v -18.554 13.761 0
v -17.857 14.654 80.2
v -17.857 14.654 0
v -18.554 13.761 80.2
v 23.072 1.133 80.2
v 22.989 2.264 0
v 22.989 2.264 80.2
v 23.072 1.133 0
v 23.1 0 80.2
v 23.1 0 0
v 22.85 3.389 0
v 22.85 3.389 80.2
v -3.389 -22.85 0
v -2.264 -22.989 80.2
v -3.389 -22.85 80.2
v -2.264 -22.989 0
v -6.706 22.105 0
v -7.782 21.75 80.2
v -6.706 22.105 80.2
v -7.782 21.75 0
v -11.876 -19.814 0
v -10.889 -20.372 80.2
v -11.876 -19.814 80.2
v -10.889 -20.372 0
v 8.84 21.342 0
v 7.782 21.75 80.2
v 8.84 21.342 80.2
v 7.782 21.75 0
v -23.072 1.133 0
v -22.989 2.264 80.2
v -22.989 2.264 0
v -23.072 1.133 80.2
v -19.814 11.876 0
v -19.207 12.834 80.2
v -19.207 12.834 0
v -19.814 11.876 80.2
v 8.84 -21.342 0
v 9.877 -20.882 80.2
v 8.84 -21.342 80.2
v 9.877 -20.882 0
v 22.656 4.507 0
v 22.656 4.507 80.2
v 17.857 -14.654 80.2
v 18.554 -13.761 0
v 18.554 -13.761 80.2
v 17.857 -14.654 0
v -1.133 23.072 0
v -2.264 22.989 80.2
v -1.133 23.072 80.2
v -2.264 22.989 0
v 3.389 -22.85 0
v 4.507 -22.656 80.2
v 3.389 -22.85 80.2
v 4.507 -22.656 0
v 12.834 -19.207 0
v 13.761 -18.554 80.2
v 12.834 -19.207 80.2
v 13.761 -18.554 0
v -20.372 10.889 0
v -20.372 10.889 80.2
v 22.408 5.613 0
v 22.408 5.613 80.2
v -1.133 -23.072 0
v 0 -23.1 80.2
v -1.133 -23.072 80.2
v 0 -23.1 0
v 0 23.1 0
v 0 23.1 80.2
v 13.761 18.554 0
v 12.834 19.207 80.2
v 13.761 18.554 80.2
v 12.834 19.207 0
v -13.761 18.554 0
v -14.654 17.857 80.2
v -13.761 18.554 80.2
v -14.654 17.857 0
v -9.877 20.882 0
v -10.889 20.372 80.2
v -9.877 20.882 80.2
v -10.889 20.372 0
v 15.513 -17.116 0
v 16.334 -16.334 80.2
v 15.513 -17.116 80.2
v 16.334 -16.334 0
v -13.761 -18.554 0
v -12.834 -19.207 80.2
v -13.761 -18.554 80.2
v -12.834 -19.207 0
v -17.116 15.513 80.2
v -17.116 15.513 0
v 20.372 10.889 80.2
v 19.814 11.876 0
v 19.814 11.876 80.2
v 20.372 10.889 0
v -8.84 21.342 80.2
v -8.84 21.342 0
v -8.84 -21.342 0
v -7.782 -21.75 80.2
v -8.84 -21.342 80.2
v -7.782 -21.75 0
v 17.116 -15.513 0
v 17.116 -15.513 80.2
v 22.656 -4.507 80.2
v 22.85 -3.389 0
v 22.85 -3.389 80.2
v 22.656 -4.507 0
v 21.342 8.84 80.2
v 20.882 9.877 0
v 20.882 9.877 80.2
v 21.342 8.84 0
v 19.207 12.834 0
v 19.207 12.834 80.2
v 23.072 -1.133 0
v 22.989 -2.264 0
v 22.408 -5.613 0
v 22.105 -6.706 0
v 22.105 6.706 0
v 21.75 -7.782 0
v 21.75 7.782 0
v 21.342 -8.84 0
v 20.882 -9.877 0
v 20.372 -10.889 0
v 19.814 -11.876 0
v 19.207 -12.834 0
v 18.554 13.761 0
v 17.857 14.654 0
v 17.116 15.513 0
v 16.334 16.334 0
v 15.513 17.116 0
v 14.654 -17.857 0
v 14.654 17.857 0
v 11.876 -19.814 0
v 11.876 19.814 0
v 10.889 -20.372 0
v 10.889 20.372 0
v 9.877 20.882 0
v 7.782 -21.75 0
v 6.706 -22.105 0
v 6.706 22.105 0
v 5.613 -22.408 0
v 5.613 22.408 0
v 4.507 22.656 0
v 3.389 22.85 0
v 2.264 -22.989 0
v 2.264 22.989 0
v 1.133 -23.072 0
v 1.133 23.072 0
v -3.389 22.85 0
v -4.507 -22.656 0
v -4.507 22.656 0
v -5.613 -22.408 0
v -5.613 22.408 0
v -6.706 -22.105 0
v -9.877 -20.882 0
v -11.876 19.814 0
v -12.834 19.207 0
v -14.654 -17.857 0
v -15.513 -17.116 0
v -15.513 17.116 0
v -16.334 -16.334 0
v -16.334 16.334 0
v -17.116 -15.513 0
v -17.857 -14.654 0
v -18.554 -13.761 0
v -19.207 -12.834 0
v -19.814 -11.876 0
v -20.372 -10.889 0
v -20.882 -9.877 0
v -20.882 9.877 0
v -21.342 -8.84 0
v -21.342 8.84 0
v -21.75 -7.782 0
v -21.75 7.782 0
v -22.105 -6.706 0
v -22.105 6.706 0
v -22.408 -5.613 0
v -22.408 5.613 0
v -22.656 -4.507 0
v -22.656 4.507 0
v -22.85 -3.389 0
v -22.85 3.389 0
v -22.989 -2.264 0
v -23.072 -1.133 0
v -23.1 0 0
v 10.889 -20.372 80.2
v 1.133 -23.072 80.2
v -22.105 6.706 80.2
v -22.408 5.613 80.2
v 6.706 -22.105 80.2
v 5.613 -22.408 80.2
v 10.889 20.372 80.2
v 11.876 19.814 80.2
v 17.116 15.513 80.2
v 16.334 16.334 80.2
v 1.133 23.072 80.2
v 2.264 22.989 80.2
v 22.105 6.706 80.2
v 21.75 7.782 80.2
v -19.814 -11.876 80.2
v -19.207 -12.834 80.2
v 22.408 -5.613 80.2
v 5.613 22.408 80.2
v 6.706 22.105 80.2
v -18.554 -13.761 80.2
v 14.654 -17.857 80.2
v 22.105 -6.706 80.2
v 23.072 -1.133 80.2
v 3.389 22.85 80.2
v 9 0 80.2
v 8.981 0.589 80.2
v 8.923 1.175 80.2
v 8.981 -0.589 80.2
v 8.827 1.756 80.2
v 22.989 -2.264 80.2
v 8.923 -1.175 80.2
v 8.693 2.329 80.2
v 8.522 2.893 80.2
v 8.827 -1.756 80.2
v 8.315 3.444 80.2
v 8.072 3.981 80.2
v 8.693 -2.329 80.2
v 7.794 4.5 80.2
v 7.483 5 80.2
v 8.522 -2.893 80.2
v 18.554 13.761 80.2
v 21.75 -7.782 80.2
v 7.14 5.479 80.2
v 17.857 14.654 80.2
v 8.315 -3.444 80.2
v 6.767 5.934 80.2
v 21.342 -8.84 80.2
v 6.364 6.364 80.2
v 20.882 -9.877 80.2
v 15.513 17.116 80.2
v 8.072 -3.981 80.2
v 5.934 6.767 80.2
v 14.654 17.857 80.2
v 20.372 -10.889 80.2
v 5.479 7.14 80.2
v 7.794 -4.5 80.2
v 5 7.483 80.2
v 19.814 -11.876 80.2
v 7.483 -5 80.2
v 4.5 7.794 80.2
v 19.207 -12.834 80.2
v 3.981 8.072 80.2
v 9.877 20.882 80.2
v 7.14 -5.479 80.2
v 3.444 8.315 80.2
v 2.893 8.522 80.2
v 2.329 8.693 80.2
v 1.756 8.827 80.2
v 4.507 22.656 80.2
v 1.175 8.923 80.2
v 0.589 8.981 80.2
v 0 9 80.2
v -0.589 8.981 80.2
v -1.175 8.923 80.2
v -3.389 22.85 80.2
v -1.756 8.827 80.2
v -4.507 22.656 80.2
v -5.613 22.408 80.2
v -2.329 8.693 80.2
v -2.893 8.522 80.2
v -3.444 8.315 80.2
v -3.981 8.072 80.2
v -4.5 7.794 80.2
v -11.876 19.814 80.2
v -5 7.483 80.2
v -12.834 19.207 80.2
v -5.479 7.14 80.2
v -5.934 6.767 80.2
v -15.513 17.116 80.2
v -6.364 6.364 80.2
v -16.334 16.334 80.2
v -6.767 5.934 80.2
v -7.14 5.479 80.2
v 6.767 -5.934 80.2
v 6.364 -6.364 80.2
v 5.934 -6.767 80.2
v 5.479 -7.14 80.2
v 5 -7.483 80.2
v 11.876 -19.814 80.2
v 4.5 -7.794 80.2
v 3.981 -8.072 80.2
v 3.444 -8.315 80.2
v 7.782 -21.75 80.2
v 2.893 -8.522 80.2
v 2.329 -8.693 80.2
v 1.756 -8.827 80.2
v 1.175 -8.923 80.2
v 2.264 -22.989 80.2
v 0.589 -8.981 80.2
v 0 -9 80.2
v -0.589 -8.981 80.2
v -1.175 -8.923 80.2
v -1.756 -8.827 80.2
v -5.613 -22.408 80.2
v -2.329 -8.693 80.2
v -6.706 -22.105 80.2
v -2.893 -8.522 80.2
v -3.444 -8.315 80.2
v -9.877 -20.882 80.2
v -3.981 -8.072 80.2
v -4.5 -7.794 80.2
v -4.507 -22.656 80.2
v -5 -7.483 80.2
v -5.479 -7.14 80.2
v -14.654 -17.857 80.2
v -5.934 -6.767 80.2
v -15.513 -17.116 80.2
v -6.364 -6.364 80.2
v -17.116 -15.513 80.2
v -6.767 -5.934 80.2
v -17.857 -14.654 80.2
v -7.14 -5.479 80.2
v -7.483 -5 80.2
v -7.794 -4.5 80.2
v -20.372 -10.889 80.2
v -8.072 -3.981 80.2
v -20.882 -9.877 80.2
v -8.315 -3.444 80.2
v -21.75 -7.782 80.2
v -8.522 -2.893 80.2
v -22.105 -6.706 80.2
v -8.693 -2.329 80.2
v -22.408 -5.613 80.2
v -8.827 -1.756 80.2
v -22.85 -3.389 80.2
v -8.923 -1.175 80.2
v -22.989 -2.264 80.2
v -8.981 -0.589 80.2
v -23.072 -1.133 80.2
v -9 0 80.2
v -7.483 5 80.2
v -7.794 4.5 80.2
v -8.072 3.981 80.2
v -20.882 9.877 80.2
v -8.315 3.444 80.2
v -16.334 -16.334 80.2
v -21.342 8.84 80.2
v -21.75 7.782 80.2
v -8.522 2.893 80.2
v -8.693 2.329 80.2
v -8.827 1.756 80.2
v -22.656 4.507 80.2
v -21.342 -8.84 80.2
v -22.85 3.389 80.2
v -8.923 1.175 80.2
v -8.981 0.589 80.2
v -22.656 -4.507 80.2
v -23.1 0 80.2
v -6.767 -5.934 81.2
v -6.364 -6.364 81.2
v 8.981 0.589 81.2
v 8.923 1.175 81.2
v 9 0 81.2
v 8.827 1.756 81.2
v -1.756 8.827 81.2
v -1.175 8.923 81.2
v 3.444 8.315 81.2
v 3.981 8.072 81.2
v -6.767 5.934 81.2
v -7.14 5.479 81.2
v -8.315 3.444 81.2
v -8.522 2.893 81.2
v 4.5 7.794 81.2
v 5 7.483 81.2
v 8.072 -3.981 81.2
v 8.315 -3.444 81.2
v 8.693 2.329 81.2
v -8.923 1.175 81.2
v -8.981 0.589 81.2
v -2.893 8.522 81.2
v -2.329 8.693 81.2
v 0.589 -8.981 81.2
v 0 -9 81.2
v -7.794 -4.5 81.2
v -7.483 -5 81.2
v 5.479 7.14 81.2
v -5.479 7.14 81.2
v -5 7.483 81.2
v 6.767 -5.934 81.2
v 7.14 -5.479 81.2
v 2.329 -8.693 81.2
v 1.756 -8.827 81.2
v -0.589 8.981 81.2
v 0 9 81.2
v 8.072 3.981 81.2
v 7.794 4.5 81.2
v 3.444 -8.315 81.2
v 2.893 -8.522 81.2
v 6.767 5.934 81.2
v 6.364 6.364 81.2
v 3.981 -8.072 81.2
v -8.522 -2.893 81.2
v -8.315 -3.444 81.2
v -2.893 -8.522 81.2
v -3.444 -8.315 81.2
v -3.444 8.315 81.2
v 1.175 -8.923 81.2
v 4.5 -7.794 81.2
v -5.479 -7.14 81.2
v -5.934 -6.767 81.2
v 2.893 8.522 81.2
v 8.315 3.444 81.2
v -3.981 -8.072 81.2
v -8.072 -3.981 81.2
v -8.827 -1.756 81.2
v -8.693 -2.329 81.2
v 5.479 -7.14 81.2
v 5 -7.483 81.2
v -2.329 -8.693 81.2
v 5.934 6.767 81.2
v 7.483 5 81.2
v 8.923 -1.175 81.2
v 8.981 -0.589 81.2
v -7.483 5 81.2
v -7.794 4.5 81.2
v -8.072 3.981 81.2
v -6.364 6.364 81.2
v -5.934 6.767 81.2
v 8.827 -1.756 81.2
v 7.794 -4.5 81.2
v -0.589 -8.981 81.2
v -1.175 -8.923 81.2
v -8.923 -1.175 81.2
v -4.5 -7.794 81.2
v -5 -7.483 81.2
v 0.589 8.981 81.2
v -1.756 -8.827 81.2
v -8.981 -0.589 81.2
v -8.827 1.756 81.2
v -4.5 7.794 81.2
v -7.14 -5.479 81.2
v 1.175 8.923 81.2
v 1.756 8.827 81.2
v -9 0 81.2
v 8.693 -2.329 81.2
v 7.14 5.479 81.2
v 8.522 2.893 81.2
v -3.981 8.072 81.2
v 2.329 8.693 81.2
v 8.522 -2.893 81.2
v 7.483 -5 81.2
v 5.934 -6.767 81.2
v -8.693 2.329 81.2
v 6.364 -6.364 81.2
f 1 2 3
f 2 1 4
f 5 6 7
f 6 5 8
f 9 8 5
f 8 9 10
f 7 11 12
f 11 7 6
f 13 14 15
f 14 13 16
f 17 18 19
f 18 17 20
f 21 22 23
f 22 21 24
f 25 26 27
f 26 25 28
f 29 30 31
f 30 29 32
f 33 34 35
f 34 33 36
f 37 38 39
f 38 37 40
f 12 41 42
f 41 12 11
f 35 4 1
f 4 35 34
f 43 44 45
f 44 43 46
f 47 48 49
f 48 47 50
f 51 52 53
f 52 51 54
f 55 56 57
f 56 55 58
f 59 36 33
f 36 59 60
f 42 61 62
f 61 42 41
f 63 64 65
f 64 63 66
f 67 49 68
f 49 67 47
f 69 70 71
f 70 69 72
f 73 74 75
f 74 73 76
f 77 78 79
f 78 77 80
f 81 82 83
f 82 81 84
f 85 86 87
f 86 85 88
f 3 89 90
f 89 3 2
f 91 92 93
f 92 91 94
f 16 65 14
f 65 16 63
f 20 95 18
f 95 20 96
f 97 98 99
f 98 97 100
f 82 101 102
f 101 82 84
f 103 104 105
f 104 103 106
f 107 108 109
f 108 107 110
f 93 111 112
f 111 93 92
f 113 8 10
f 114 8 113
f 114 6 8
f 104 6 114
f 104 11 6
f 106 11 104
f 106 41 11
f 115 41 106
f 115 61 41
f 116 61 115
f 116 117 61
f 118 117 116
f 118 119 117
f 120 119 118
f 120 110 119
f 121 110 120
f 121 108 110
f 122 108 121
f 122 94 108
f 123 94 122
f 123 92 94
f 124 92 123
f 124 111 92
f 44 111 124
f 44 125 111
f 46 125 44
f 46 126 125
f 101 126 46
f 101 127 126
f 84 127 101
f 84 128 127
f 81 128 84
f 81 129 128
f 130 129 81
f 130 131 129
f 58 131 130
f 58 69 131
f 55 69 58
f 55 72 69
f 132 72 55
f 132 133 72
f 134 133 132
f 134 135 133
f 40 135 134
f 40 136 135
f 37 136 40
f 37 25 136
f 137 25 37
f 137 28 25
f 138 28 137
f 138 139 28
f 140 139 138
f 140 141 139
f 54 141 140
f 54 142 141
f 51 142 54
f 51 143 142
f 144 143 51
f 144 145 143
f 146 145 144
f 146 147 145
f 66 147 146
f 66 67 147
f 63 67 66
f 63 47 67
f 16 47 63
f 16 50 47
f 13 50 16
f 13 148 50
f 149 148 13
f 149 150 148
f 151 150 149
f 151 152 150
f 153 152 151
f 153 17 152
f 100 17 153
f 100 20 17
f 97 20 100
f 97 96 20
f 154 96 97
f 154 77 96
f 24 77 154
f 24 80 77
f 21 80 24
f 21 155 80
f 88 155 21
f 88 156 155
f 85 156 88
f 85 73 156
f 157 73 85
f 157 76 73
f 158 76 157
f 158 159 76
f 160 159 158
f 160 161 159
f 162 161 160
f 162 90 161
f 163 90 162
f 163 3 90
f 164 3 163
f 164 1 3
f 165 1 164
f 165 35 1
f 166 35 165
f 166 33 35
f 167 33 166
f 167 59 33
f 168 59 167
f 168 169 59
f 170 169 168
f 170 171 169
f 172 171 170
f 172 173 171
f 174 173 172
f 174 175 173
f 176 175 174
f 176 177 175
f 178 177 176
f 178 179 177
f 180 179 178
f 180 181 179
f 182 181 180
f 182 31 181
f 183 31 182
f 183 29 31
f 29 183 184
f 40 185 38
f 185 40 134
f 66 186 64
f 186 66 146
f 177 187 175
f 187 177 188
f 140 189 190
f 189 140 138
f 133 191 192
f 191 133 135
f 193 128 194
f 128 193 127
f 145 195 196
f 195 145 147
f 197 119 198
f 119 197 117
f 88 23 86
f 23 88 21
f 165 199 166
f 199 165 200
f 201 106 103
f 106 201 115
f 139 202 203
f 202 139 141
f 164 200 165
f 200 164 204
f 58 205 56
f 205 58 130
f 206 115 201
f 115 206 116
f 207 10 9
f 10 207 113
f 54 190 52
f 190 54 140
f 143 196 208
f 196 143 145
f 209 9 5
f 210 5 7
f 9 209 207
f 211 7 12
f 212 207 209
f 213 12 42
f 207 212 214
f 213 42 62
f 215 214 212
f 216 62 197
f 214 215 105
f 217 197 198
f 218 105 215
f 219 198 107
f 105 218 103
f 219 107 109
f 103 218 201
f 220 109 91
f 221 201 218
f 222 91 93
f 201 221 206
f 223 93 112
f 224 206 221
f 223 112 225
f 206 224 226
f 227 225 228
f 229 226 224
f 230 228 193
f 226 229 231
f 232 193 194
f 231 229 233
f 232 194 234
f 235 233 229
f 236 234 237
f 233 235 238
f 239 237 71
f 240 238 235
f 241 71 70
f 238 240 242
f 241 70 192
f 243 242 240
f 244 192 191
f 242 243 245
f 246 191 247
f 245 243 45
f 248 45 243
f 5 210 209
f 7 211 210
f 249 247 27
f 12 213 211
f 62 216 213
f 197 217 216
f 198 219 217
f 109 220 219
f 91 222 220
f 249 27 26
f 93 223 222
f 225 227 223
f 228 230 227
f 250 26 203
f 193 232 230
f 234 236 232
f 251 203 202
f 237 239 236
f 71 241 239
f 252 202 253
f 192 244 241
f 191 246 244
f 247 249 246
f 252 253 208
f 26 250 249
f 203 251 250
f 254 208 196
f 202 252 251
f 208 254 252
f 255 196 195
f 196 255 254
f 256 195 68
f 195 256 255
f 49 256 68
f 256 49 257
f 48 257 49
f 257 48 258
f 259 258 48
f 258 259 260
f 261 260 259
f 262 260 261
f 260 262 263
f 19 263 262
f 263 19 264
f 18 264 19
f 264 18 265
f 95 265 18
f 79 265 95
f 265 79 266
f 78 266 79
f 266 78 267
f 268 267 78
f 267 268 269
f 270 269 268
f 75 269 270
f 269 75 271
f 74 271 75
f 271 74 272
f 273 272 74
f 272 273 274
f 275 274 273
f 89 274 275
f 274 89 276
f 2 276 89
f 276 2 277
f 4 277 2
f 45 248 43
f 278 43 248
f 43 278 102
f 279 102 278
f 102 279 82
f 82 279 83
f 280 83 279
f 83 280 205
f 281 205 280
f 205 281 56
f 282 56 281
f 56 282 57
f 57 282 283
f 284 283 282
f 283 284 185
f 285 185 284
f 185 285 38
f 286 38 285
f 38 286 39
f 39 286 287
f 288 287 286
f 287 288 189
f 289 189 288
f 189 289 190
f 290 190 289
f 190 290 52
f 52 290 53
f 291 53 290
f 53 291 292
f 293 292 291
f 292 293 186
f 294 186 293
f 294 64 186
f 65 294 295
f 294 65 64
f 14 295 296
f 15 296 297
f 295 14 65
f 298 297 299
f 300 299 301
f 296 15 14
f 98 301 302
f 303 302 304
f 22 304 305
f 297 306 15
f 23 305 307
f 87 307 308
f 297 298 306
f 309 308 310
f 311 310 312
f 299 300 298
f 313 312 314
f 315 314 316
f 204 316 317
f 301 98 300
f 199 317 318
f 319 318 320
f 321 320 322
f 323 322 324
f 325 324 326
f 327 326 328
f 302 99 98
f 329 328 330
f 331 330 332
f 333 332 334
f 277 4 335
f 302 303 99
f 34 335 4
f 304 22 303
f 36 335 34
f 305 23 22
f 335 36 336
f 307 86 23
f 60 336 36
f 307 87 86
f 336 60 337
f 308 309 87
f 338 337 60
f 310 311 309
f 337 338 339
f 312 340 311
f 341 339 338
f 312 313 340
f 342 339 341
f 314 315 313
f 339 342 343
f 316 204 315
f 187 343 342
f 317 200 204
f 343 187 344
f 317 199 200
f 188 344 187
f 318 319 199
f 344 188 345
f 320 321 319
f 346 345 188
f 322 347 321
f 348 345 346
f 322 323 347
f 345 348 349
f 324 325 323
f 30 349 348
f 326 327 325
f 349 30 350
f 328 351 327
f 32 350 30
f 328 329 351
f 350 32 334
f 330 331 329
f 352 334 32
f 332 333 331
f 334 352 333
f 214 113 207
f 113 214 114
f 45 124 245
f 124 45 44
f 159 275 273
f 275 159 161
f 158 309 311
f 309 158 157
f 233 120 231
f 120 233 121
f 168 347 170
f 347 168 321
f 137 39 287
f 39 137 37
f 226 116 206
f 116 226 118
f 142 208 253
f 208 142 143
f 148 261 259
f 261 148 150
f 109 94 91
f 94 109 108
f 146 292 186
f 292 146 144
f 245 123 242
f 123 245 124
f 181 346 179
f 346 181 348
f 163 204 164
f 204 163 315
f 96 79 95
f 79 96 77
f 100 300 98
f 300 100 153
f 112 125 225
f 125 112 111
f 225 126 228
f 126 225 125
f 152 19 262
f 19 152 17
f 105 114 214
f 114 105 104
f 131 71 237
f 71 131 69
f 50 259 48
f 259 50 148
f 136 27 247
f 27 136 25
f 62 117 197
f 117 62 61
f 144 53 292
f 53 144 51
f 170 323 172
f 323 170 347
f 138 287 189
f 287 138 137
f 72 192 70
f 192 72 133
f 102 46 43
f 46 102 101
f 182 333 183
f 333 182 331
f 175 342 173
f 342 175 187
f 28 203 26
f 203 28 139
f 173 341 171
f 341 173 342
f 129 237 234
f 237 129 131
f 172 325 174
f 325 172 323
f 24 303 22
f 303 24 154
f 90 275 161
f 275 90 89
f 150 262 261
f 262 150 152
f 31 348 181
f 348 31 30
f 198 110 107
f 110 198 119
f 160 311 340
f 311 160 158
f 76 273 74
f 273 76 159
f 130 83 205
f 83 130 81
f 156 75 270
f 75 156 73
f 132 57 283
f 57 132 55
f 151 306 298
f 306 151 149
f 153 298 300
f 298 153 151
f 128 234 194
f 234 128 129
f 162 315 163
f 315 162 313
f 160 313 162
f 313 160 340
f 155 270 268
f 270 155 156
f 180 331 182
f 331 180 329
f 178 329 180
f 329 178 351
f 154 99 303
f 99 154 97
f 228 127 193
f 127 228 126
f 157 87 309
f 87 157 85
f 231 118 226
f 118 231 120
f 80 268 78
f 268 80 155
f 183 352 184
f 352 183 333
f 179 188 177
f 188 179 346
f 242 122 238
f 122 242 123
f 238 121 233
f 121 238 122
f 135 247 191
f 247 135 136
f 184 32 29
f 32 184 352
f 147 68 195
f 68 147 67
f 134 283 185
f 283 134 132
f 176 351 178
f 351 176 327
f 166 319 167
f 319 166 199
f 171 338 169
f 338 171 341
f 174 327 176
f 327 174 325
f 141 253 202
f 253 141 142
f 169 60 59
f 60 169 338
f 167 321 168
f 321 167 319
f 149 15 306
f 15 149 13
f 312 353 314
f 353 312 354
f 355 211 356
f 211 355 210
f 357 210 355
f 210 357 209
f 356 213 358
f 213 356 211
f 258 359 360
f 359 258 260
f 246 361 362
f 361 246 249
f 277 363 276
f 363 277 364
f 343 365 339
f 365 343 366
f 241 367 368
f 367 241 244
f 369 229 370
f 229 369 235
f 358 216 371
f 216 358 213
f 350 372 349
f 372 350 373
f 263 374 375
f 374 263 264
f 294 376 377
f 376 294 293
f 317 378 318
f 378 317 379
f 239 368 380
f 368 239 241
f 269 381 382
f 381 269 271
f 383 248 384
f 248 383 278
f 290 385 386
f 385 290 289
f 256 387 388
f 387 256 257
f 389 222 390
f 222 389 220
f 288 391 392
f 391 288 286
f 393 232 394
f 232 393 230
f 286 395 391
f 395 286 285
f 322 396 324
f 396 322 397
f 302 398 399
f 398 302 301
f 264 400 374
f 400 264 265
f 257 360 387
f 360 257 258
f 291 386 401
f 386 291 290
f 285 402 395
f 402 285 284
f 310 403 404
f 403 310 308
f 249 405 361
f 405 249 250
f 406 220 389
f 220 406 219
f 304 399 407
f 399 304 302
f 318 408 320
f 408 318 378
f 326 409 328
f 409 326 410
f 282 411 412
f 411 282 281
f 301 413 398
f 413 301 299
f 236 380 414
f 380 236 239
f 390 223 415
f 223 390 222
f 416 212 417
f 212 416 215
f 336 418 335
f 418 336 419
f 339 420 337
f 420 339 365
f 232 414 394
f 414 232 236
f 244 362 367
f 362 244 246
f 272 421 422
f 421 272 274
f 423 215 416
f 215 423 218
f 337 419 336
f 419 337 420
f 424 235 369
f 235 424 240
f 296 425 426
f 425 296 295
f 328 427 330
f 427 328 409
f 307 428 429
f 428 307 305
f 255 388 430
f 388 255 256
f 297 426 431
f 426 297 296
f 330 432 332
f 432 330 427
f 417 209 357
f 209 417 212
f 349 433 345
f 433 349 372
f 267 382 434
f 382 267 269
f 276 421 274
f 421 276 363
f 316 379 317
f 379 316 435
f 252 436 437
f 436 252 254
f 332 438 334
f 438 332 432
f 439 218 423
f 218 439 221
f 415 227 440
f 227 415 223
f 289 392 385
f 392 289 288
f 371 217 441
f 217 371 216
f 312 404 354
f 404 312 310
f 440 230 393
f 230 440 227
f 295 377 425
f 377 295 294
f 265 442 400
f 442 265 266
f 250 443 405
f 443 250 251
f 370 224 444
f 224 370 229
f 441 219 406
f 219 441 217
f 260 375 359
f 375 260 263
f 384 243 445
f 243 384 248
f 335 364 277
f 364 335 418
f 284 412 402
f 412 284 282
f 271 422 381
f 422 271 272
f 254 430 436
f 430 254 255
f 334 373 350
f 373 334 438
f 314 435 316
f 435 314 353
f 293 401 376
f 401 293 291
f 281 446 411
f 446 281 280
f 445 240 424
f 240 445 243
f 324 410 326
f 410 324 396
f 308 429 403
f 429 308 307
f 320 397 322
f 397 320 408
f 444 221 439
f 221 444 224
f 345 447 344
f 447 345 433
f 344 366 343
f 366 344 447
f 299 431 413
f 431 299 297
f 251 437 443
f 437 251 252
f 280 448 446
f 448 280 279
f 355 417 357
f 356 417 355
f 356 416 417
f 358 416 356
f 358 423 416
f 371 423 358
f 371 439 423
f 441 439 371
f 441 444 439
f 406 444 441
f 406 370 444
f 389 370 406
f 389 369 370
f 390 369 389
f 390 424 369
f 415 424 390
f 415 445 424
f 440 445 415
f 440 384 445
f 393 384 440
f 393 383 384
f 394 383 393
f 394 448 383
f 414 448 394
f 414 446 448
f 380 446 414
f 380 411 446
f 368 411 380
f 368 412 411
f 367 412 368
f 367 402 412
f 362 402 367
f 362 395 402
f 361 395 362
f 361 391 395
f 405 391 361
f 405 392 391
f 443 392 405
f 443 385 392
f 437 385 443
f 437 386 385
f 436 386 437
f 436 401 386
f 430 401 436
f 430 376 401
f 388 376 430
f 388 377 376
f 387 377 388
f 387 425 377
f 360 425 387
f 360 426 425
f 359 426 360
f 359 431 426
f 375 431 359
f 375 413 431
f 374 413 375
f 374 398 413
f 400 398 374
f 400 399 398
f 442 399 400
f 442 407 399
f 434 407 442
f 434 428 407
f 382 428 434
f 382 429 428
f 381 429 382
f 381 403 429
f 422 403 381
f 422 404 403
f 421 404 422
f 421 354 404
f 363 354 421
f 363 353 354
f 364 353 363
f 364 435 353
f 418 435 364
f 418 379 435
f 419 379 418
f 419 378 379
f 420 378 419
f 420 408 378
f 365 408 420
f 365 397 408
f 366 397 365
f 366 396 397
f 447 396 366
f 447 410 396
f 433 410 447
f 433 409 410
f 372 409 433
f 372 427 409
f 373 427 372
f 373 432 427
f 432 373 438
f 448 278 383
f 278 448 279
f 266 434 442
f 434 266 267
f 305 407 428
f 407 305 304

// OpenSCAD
// Battery cell: 80.2mm tall, 46.2mm diameter (one connected solid)

$fn = 128;

// Parameters
overall_height_mm = 80.2; //[40.1:160.4:0.1]
outer_diameter_mm = 46.2; //[23.1:92.4:0.1]

positive_terminal_diameter_mm = 18; //[9:36:0.1]
positive_terminal_height_mm   = 2;  //[1:4:0.1]

negative_terminal_diameter_mm = 12; //[6:24:0.1]
negative_terminal_height_mm   = 0.5;//[0.25:1:0.05]

terminal_overlap_mm = 1; //[0.5:2:0.1]

// Derived
body_height_mm   = overall_height_mm;
body_radius_mm   = outer_diameter_mm / 2;

// Battery - complete geometry (single connected solid)
module battery() {
    union() {
        // Main cylindrical body (not centered to avoid "blank" renders in some pipelines)
        cylinder(h=body_height_mm, r=body_radius_mm, center=false);

        // Positive terminal button (overlaps into body)
        translate([0, 0, body_height_mm - terminal_overlap_mm])
            cylinder(h=positive_terminal_height_mm, r=positive_terminal_diameter_mm/2, center=false, $fn=96);

        // Negative terminal contact (overlaps into body)
        translate([0, 0, -negative_terminal_height_mm + terminal_overlap_mm])
            cylinder(h=negative_terminal_height_mm, r=negative_terminal_diameter_mm/2, center=false, $fn=96);
    }
}

battery();
